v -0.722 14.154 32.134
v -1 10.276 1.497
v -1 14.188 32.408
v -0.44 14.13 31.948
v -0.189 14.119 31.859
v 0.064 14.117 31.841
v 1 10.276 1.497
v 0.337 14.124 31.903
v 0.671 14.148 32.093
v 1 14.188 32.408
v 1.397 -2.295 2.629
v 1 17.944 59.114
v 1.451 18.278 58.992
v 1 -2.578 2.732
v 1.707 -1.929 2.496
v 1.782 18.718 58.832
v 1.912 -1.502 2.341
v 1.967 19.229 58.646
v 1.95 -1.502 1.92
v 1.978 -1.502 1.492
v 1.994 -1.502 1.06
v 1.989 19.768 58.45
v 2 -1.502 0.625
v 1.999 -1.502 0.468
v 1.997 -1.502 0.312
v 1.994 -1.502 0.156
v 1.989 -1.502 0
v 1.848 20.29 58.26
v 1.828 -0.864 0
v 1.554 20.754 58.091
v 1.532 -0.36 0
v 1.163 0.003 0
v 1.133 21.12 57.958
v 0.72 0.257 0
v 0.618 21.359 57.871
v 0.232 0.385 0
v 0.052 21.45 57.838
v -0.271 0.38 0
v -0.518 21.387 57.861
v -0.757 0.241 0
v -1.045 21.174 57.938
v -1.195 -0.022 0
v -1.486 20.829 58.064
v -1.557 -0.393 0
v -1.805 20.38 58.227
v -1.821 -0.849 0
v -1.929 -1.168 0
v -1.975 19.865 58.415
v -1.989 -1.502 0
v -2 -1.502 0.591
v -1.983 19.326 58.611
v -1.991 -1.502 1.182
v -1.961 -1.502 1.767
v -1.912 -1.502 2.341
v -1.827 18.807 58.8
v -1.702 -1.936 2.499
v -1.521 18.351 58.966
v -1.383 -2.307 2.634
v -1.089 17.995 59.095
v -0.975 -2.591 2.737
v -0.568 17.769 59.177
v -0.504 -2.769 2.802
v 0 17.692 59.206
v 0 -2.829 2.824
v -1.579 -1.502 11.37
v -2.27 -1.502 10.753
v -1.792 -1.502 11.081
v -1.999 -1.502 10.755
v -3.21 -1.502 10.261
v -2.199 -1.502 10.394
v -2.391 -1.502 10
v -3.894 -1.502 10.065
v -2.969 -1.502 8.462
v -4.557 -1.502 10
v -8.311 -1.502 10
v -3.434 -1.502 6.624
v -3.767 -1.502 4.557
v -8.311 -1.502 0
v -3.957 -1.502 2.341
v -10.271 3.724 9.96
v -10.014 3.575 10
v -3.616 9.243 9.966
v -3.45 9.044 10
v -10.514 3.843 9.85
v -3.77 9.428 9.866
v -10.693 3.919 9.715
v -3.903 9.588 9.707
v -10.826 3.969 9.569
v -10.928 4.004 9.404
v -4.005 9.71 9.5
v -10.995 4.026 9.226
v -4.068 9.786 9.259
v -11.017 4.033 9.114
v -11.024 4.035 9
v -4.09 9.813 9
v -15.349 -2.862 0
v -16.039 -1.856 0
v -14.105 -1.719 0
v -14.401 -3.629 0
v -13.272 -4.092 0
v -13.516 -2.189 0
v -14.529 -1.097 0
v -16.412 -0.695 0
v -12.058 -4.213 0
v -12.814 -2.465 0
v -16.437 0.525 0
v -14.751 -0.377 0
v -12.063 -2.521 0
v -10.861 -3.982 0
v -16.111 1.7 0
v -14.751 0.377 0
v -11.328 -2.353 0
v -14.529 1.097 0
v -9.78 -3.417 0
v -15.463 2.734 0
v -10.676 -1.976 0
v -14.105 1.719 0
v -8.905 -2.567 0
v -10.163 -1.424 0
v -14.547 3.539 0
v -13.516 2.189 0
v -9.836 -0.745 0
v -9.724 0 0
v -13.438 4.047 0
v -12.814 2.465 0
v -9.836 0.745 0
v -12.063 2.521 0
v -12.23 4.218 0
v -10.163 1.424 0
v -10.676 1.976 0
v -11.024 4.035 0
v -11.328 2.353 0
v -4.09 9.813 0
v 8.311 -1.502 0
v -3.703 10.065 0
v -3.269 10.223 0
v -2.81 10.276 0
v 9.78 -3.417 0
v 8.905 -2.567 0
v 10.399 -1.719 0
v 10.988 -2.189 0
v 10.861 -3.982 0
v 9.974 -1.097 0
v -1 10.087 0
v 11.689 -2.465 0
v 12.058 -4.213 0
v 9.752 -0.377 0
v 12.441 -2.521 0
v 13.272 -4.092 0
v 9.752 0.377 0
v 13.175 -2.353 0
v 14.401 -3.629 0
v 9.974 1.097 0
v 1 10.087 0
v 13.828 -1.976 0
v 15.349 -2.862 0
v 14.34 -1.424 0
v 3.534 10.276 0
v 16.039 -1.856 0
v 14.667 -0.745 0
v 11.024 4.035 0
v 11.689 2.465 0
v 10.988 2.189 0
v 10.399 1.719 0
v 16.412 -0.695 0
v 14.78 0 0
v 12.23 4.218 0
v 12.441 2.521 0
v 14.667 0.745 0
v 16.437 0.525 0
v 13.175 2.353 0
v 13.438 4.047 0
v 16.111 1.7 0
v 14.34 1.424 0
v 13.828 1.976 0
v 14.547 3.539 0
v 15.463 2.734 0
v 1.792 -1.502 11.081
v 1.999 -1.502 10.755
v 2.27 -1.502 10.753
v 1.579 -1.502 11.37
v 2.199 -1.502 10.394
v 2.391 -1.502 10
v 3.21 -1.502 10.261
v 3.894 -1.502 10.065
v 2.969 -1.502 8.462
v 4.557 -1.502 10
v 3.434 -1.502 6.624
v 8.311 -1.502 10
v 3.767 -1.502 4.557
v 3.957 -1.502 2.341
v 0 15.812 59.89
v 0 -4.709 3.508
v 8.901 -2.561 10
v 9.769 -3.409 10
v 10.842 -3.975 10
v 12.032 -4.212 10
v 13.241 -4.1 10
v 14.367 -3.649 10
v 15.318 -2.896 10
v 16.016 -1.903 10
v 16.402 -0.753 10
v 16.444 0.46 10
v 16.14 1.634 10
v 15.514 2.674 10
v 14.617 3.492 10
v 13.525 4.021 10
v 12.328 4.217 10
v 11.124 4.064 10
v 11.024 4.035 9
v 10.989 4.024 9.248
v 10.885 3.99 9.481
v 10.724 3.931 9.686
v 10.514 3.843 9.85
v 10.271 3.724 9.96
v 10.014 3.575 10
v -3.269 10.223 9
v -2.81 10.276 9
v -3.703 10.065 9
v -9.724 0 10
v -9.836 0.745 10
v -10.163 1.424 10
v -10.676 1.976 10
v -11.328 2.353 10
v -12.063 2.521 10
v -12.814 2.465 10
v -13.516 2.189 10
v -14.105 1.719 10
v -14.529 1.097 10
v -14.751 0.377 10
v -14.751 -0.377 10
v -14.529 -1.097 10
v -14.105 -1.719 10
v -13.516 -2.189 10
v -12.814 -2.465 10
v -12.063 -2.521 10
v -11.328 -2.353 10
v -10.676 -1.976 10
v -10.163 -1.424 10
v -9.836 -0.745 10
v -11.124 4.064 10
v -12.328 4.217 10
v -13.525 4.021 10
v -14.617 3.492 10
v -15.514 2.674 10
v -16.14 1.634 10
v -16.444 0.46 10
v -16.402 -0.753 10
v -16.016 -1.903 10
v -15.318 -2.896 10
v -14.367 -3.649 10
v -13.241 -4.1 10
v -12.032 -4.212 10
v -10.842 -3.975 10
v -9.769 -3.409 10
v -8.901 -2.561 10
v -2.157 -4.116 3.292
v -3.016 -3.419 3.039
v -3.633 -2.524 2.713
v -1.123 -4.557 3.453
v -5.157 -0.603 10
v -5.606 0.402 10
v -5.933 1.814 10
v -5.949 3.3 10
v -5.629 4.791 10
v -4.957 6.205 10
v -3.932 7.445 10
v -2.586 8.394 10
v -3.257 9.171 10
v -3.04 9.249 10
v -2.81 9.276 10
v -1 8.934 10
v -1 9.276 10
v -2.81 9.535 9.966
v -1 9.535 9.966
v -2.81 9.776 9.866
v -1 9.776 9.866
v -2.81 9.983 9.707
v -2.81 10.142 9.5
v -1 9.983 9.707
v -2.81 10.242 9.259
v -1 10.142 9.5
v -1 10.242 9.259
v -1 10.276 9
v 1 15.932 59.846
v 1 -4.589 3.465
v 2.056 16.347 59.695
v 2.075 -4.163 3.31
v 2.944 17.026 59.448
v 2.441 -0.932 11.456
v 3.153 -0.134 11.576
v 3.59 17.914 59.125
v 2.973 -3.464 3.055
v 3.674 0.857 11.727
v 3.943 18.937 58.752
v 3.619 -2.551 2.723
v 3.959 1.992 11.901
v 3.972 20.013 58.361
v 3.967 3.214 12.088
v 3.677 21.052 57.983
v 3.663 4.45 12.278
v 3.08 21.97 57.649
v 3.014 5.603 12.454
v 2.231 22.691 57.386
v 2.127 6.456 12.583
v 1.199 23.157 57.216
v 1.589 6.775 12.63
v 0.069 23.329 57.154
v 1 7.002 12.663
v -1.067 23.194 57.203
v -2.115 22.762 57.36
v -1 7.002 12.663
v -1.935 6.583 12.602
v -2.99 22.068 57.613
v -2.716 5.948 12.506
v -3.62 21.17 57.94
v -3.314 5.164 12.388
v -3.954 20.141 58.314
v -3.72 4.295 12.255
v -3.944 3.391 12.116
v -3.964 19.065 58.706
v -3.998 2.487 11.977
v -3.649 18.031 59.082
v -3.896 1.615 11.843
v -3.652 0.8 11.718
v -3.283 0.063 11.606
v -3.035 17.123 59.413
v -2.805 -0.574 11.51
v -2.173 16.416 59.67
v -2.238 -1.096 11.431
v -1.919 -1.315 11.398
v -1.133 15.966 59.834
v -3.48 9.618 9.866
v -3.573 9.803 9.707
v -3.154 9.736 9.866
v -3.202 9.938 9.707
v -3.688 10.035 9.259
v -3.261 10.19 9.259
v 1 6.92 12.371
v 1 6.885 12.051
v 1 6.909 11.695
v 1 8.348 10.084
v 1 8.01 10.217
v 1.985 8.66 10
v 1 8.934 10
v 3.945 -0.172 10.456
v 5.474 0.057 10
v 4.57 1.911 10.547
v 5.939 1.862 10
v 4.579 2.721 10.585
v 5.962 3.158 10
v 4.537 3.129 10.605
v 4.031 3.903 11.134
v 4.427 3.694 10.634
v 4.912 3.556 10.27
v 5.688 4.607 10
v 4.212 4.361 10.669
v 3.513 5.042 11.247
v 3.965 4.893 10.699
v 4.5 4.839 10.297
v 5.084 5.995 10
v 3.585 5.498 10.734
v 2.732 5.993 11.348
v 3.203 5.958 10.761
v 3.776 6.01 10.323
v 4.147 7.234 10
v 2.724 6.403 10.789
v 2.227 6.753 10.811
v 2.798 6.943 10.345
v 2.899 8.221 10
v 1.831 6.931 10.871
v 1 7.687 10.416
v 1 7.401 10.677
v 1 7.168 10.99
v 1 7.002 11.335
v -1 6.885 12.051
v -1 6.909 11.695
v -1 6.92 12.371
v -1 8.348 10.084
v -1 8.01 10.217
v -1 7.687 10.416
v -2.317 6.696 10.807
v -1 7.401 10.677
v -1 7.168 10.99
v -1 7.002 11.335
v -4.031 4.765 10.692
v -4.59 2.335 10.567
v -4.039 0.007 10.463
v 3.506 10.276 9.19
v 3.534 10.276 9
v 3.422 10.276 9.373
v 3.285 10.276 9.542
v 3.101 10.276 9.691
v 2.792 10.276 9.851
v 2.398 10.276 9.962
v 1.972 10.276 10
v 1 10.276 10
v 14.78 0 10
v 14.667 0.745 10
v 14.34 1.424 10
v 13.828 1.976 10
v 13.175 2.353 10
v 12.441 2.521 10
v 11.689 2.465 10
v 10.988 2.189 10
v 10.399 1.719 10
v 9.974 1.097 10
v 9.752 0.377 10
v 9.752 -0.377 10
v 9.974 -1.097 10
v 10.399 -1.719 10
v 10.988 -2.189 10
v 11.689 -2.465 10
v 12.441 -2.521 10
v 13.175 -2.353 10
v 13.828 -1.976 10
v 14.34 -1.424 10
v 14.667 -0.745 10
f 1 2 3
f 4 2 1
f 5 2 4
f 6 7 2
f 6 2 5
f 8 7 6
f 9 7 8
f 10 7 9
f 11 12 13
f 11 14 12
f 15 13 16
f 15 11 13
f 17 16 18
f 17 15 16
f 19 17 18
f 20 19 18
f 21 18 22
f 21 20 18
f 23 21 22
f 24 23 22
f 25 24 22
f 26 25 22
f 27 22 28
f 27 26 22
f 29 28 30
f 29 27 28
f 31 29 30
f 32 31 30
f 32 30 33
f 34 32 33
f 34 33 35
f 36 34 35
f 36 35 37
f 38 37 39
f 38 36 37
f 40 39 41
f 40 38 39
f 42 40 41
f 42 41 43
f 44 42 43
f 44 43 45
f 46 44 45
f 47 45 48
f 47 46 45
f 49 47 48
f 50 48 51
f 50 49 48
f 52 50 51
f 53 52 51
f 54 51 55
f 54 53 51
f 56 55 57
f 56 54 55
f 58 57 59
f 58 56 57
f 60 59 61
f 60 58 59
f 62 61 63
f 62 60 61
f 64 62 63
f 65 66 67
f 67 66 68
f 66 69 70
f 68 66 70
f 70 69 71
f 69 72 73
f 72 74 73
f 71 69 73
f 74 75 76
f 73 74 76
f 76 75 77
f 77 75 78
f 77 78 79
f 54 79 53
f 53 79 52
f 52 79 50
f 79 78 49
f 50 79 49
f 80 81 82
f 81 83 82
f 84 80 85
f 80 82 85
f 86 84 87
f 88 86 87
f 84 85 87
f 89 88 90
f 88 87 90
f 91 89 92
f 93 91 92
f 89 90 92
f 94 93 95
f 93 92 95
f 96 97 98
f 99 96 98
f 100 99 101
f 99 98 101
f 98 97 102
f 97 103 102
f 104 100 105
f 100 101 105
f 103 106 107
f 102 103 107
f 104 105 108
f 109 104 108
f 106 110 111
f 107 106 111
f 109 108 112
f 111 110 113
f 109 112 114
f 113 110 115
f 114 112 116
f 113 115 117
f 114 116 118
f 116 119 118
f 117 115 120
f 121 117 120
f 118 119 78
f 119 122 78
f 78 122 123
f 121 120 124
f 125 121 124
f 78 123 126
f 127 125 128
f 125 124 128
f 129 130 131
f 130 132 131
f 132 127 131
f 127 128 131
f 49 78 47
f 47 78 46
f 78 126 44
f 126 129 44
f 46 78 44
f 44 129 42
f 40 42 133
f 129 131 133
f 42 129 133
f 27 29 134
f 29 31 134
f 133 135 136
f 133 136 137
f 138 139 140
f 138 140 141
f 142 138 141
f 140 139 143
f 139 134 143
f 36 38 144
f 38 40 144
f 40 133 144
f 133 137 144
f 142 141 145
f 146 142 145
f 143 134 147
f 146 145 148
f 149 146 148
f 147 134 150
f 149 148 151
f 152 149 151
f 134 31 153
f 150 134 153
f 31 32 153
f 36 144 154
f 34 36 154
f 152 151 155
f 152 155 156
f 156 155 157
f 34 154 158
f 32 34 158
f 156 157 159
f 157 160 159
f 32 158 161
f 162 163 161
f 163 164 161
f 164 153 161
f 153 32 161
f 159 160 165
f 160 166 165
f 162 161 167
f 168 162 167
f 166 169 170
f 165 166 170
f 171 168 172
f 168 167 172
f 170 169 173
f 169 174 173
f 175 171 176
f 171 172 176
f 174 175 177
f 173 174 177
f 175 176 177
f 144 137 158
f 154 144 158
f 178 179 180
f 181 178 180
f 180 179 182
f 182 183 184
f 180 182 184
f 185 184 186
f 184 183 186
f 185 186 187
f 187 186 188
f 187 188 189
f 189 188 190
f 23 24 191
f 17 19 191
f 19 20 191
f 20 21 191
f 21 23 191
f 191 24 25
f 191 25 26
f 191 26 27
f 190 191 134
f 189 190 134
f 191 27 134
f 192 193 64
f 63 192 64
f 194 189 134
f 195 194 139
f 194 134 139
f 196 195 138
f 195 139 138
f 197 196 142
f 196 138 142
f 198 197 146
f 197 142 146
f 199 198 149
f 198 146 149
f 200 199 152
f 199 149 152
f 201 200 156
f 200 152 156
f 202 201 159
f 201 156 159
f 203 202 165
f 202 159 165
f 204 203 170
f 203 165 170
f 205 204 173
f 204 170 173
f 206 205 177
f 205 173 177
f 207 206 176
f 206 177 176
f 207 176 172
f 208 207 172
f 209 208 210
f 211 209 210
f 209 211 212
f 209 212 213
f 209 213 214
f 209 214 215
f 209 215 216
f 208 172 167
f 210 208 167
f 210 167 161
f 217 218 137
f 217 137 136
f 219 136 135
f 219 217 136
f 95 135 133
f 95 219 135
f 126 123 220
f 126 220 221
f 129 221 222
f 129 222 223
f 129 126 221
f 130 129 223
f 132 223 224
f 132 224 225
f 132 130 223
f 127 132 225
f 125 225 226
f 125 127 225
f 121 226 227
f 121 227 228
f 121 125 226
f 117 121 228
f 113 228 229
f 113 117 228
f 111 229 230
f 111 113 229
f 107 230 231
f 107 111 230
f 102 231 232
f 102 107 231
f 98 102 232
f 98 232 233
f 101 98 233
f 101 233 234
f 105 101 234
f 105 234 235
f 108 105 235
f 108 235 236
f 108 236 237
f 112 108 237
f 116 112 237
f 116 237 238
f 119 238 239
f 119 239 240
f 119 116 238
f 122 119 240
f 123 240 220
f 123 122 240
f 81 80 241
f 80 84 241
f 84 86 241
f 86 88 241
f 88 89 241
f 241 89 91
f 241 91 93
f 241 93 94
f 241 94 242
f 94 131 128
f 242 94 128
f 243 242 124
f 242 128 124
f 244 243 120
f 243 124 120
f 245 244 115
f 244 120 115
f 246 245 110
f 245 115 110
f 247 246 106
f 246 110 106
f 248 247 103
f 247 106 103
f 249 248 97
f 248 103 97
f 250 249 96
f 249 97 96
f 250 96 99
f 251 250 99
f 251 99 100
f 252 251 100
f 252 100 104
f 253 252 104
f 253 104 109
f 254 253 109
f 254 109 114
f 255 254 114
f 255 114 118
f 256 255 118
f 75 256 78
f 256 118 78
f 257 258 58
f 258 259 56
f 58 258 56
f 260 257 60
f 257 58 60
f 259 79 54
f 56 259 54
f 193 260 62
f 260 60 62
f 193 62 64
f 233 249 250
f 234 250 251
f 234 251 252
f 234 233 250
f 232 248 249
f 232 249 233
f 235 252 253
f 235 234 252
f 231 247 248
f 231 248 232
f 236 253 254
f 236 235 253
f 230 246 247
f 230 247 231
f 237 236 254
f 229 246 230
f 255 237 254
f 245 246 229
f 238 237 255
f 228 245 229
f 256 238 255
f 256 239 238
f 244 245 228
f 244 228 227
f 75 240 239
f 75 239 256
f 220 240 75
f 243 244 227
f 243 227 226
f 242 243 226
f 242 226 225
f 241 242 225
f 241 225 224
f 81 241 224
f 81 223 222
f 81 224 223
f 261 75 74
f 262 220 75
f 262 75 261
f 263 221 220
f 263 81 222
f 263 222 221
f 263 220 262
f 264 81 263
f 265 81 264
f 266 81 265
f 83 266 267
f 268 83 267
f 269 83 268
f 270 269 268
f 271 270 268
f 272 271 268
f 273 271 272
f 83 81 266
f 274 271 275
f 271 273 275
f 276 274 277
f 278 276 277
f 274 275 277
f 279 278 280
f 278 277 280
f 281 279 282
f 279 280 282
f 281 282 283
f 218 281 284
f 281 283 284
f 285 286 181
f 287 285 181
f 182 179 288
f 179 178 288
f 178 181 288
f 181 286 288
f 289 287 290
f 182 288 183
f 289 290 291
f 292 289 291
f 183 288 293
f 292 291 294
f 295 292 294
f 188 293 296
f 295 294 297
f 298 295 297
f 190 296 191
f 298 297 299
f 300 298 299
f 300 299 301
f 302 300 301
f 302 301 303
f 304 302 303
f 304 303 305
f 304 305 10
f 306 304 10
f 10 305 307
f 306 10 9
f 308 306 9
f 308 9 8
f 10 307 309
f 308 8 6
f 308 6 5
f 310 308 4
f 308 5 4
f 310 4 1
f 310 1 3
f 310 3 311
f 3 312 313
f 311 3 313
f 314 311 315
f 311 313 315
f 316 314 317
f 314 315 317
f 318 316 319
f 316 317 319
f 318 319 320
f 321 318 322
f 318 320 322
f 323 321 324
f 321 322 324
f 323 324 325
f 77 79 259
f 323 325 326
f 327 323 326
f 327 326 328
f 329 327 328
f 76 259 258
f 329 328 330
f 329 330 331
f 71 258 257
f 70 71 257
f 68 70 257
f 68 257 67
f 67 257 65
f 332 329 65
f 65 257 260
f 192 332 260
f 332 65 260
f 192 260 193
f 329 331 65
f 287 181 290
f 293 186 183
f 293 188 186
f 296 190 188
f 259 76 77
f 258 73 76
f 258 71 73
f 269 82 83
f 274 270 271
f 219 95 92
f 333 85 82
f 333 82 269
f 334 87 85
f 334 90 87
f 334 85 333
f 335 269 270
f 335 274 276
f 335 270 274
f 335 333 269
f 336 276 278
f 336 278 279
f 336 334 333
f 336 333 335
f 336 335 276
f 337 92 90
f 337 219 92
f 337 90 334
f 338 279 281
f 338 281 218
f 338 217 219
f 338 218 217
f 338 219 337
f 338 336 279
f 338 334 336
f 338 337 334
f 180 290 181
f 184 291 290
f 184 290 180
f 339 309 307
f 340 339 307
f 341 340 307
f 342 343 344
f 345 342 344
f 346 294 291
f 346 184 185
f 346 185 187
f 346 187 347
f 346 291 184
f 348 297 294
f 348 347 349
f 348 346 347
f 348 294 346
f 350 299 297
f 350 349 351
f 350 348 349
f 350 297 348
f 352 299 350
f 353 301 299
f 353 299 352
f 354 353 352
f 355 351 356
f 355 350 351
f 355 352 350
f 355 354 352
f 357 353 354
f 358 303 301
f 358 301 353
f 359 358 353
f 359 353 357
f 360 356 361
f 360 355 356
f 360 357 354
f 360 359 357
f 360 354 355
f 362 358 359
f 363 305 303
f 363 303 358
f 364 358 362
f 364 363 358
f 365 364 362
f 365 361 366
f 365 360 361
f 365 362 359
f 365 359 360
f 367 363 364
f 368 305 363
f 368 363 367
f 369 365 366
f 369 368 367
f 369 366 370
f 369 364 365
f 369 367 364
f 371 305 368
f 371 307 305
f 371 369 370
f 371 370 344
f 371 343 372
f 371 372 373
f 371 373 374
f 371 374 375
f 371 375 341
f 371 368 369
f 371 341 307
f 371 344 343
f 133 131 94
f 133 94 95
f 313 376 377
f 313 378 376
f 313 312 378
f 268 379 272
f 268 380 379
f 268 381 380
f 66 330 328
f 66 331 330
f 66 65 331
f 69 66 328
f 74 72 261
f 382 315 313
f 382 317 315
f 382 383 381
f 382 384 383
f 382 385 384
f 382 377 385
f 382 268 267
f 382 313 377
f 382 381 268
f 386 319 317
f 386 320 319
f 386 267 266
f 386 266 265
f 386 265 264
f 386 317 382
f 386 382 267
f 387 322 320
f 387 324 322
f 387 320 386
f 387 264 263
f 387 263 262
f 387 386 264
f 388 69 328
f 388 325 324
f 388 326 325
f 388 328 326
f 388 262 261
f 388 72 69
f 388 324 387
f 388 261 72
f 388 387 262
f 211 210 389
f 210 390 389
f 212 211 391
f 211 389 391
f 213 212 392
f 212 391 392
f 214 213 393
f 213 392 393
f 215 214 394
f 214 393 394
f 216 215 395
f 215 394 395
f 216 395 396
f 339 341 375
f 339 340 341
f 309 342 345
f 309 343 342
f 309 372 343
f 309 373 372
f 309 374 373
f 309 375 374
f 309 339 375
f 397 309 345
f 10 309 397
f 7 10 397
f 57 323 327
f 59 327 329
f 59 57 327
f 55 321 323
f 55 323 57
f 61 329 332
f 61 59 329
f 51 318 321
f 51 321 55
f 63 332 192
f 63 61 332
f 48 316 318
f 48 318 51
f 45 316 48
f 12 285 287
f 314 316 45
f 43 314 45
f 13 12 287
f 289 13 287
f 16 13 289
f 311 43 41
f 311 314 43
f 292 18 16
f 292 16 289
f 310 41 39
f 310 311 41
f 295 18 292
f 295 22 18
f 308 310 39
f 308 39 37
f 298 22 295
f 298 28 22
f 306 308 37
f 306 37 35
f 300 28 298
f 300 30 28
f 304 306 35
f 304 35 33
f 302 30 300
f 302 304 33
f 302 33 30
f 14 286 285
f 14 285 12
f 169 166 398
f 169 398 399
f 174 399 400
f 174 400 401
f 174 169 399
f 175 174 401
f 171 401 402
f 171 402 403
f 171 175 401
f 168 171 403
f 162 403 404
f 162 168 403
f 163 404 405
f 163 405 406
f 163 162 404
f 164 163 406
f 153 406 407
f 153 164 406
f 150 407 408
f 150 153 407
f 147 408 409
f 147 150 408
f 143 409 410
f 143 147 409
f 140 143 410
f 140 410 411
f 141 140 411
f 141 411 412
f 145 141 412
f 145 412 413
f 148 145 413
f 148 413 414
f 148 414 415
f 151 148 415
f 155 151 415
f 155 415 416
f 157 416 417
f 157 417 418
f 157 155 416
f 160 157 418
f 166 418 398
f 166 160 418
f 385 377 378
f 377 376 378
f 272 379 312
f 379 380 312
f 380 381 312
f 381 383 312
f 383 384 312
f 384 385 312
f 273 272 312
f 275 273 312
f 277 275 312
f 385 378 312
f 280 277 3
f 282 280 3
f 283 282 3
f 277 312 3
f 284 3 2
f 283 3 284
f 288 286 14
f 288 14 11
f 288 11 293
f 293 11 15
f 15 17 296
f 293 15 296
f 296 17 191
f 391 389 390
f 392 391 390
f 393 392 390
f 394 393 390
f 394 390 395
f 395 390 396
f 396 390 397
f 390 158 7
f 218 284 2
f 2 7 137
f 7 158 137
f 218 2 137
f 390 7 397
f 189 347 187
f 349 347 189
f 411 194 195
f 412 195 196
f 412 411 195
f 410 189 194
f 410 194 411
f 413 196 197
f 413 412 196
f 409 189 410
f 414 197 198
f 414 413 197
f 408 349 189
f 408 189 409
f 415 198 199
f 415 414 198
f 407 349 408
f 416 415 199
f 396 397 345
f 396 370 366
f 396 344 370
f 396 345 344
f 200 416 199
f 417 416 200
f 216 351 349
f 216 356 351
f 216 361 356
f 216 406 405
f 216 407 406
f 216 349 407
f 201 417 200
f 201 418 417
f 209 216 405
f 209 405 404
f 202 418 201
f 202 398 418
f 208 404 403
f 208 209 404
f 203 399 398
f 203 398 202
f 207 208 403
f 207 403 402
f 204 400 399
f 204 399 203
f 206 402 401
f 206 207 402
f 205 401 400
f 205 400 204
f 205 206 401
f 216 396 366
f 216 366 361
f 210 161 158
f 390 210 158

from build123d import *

# Parameters (mm, degrees)
PAD001_DEPTH                = 1
BOX_W                       = 1
BOX_H                       = 4
BOX_DEPTH                   = 62
BOX_PLACEMENT_ANGLE         = 340
CYLINDER_R                  = 2
CYLINDER_DEPTH              = 67
CYLINDER_PLACEMENT_ANGLE    = 340
CYLINDER001_R               = 4
CYLINDER001_DEPTH           = 60
CYLINDER001_PLACEMENT_ANGLE = 20
SKETCH_R                    = 2.527902
PAD_DEPTH                   = 10
FILLET_R                    = 2
FILLET001_R                 = 2
FILLET003_R                 = 1


with BuildPart() as body001:
    # Sketch001 → Pad001 (new body, symmetric)
    with BuildSketch(Plane.YZ):
        Polygon((11.126045, 25.12734), (5.15667, 9.780665), (10.086619, 0), (14.214679, 32.616486), align=None)
    extrude(amount=PAD001_DEPTH, both=True)


with BuildPart() as box:
    # Box → Box (new body)
    with BuildSketch(Plane.XY):
        with Locations((0.5, 2)):
            Rectangle(BOX_W, BOX_H)
    extrude(amount=BOX_DEPTH)


with BuildPart() as box_1:
    # Box placement: moved
    add(box.part.moved(Location((0, -5.296136, 2.991813))).rotate(Axis((0, -5.296136, 2.991813), (1, 0, 0)), BOX_PLACEMENT_ANGLE))


with BuildPart() as cylinder:
    # Cylinder → Cylinder (new body)
    with BuildSketch(Plane.XY):
        Circle(CYLINDER_R)
    extrude(amount=CYLINDER_DEPTH)


with BuildPart() as cylinder_1:
    # Cylinder placement: moved
    add(cylinder.part.moved(Location((0, -2.318081, -1.61877))).rotate(Axis((0, -2.318081, -1.61877), (1, 0, 0)), CYLINDER_PLACEMENT_ANGLE))


with BuildPart() as cylinder001:
    # Cylinder001 → Cylinder001 (new body)
    with BuildSketch(Plane.XY):
        Circle(CYLINDER001_R)
    extrude(amount=CYLINDER001_DEPTH)


with BuildPart() as cylinder001_1:
    # Cylinder001 placement: moved
    add(cylinder001.part.moved(Location((0, -0.95, 2.14))).rotate(Axis((0, -0.95, 2.14), (-1, 0, 0)), CYLINDER001_PLACEMENT_ANGLE))


with BuildPart() as fillet003:
    # Sketch → Pad (new body)
    with BuildSketch(Plane.XY):
        with BuildLine():
            ThreePointArc((-11.024148, 4.03498), (-16.038919, -1.856194), (-8.310522, -1.501592))
            Line((-8.310522, -1.501592), (0, -1.501592))
            Line((8.310522, -1.501592), (0, -1.501592))
            ThreePointArc((8.310522, -1.501592), (16.038919, -1.856194), (11.024148, 4.03498))
            Line((11.024148, 4.03498), (3.534046, 10.276075))
            Line((3.534046, 10.276075), (0, 10.276075))
            Line((-3.534046, 10.276075), (0, 10.276075))
            Line((-11.024148, 4.03498), (-3.534046, 10.276075))
        make_face()
        with Locations((-12.251753, 0)):
            Circle(SKETCH_R, mode=Mode.SUBTRACT)
        with Locations((12.251753, 0)):
            Circle(SKETCH_R, mode=Mode.SUBTRACT)
    extrude(amount=PAD_DEPTH)

    # Fusion: union Cylinder001
    add(cylinder001_1.part)

    # Cut: cut Cylinder
    add(cylinder_1.part, mode=Mode.SUBTRACT)

    # Cut001: cut Box
    add(box_1.part, mode=Mode.SUBTRACT)

    # Fillet
    fillet_edges = [fillet003.edges().sort_by_distance(p)[0] for p in [
        (-1.866147, 5.675875, 10),
    ]]
    fillet(fillet_edges, radius=FILLET_R)

    # Fusion001: union Body001
    add(body001.part)

    # Fillet001
    fillet001_edges = [fillet003.edges().sort_by_distance(p)[0] for p in [
        (-3.534046, 10.276075, 5),
    ]]
    fillet(fillet001_edges, radius=FILLET001_R)

    # Fillet003
    fillet003_edges = [fillet003.edges().sort_by_distance(p)[0] for p in [
        (-7.557221, 6.923782, 10),
        (7.279097, 7.155528, 10),
    ]]
    fillet(fillet003_edges, radius=FILLET003_R)


solid = fillet003.part
